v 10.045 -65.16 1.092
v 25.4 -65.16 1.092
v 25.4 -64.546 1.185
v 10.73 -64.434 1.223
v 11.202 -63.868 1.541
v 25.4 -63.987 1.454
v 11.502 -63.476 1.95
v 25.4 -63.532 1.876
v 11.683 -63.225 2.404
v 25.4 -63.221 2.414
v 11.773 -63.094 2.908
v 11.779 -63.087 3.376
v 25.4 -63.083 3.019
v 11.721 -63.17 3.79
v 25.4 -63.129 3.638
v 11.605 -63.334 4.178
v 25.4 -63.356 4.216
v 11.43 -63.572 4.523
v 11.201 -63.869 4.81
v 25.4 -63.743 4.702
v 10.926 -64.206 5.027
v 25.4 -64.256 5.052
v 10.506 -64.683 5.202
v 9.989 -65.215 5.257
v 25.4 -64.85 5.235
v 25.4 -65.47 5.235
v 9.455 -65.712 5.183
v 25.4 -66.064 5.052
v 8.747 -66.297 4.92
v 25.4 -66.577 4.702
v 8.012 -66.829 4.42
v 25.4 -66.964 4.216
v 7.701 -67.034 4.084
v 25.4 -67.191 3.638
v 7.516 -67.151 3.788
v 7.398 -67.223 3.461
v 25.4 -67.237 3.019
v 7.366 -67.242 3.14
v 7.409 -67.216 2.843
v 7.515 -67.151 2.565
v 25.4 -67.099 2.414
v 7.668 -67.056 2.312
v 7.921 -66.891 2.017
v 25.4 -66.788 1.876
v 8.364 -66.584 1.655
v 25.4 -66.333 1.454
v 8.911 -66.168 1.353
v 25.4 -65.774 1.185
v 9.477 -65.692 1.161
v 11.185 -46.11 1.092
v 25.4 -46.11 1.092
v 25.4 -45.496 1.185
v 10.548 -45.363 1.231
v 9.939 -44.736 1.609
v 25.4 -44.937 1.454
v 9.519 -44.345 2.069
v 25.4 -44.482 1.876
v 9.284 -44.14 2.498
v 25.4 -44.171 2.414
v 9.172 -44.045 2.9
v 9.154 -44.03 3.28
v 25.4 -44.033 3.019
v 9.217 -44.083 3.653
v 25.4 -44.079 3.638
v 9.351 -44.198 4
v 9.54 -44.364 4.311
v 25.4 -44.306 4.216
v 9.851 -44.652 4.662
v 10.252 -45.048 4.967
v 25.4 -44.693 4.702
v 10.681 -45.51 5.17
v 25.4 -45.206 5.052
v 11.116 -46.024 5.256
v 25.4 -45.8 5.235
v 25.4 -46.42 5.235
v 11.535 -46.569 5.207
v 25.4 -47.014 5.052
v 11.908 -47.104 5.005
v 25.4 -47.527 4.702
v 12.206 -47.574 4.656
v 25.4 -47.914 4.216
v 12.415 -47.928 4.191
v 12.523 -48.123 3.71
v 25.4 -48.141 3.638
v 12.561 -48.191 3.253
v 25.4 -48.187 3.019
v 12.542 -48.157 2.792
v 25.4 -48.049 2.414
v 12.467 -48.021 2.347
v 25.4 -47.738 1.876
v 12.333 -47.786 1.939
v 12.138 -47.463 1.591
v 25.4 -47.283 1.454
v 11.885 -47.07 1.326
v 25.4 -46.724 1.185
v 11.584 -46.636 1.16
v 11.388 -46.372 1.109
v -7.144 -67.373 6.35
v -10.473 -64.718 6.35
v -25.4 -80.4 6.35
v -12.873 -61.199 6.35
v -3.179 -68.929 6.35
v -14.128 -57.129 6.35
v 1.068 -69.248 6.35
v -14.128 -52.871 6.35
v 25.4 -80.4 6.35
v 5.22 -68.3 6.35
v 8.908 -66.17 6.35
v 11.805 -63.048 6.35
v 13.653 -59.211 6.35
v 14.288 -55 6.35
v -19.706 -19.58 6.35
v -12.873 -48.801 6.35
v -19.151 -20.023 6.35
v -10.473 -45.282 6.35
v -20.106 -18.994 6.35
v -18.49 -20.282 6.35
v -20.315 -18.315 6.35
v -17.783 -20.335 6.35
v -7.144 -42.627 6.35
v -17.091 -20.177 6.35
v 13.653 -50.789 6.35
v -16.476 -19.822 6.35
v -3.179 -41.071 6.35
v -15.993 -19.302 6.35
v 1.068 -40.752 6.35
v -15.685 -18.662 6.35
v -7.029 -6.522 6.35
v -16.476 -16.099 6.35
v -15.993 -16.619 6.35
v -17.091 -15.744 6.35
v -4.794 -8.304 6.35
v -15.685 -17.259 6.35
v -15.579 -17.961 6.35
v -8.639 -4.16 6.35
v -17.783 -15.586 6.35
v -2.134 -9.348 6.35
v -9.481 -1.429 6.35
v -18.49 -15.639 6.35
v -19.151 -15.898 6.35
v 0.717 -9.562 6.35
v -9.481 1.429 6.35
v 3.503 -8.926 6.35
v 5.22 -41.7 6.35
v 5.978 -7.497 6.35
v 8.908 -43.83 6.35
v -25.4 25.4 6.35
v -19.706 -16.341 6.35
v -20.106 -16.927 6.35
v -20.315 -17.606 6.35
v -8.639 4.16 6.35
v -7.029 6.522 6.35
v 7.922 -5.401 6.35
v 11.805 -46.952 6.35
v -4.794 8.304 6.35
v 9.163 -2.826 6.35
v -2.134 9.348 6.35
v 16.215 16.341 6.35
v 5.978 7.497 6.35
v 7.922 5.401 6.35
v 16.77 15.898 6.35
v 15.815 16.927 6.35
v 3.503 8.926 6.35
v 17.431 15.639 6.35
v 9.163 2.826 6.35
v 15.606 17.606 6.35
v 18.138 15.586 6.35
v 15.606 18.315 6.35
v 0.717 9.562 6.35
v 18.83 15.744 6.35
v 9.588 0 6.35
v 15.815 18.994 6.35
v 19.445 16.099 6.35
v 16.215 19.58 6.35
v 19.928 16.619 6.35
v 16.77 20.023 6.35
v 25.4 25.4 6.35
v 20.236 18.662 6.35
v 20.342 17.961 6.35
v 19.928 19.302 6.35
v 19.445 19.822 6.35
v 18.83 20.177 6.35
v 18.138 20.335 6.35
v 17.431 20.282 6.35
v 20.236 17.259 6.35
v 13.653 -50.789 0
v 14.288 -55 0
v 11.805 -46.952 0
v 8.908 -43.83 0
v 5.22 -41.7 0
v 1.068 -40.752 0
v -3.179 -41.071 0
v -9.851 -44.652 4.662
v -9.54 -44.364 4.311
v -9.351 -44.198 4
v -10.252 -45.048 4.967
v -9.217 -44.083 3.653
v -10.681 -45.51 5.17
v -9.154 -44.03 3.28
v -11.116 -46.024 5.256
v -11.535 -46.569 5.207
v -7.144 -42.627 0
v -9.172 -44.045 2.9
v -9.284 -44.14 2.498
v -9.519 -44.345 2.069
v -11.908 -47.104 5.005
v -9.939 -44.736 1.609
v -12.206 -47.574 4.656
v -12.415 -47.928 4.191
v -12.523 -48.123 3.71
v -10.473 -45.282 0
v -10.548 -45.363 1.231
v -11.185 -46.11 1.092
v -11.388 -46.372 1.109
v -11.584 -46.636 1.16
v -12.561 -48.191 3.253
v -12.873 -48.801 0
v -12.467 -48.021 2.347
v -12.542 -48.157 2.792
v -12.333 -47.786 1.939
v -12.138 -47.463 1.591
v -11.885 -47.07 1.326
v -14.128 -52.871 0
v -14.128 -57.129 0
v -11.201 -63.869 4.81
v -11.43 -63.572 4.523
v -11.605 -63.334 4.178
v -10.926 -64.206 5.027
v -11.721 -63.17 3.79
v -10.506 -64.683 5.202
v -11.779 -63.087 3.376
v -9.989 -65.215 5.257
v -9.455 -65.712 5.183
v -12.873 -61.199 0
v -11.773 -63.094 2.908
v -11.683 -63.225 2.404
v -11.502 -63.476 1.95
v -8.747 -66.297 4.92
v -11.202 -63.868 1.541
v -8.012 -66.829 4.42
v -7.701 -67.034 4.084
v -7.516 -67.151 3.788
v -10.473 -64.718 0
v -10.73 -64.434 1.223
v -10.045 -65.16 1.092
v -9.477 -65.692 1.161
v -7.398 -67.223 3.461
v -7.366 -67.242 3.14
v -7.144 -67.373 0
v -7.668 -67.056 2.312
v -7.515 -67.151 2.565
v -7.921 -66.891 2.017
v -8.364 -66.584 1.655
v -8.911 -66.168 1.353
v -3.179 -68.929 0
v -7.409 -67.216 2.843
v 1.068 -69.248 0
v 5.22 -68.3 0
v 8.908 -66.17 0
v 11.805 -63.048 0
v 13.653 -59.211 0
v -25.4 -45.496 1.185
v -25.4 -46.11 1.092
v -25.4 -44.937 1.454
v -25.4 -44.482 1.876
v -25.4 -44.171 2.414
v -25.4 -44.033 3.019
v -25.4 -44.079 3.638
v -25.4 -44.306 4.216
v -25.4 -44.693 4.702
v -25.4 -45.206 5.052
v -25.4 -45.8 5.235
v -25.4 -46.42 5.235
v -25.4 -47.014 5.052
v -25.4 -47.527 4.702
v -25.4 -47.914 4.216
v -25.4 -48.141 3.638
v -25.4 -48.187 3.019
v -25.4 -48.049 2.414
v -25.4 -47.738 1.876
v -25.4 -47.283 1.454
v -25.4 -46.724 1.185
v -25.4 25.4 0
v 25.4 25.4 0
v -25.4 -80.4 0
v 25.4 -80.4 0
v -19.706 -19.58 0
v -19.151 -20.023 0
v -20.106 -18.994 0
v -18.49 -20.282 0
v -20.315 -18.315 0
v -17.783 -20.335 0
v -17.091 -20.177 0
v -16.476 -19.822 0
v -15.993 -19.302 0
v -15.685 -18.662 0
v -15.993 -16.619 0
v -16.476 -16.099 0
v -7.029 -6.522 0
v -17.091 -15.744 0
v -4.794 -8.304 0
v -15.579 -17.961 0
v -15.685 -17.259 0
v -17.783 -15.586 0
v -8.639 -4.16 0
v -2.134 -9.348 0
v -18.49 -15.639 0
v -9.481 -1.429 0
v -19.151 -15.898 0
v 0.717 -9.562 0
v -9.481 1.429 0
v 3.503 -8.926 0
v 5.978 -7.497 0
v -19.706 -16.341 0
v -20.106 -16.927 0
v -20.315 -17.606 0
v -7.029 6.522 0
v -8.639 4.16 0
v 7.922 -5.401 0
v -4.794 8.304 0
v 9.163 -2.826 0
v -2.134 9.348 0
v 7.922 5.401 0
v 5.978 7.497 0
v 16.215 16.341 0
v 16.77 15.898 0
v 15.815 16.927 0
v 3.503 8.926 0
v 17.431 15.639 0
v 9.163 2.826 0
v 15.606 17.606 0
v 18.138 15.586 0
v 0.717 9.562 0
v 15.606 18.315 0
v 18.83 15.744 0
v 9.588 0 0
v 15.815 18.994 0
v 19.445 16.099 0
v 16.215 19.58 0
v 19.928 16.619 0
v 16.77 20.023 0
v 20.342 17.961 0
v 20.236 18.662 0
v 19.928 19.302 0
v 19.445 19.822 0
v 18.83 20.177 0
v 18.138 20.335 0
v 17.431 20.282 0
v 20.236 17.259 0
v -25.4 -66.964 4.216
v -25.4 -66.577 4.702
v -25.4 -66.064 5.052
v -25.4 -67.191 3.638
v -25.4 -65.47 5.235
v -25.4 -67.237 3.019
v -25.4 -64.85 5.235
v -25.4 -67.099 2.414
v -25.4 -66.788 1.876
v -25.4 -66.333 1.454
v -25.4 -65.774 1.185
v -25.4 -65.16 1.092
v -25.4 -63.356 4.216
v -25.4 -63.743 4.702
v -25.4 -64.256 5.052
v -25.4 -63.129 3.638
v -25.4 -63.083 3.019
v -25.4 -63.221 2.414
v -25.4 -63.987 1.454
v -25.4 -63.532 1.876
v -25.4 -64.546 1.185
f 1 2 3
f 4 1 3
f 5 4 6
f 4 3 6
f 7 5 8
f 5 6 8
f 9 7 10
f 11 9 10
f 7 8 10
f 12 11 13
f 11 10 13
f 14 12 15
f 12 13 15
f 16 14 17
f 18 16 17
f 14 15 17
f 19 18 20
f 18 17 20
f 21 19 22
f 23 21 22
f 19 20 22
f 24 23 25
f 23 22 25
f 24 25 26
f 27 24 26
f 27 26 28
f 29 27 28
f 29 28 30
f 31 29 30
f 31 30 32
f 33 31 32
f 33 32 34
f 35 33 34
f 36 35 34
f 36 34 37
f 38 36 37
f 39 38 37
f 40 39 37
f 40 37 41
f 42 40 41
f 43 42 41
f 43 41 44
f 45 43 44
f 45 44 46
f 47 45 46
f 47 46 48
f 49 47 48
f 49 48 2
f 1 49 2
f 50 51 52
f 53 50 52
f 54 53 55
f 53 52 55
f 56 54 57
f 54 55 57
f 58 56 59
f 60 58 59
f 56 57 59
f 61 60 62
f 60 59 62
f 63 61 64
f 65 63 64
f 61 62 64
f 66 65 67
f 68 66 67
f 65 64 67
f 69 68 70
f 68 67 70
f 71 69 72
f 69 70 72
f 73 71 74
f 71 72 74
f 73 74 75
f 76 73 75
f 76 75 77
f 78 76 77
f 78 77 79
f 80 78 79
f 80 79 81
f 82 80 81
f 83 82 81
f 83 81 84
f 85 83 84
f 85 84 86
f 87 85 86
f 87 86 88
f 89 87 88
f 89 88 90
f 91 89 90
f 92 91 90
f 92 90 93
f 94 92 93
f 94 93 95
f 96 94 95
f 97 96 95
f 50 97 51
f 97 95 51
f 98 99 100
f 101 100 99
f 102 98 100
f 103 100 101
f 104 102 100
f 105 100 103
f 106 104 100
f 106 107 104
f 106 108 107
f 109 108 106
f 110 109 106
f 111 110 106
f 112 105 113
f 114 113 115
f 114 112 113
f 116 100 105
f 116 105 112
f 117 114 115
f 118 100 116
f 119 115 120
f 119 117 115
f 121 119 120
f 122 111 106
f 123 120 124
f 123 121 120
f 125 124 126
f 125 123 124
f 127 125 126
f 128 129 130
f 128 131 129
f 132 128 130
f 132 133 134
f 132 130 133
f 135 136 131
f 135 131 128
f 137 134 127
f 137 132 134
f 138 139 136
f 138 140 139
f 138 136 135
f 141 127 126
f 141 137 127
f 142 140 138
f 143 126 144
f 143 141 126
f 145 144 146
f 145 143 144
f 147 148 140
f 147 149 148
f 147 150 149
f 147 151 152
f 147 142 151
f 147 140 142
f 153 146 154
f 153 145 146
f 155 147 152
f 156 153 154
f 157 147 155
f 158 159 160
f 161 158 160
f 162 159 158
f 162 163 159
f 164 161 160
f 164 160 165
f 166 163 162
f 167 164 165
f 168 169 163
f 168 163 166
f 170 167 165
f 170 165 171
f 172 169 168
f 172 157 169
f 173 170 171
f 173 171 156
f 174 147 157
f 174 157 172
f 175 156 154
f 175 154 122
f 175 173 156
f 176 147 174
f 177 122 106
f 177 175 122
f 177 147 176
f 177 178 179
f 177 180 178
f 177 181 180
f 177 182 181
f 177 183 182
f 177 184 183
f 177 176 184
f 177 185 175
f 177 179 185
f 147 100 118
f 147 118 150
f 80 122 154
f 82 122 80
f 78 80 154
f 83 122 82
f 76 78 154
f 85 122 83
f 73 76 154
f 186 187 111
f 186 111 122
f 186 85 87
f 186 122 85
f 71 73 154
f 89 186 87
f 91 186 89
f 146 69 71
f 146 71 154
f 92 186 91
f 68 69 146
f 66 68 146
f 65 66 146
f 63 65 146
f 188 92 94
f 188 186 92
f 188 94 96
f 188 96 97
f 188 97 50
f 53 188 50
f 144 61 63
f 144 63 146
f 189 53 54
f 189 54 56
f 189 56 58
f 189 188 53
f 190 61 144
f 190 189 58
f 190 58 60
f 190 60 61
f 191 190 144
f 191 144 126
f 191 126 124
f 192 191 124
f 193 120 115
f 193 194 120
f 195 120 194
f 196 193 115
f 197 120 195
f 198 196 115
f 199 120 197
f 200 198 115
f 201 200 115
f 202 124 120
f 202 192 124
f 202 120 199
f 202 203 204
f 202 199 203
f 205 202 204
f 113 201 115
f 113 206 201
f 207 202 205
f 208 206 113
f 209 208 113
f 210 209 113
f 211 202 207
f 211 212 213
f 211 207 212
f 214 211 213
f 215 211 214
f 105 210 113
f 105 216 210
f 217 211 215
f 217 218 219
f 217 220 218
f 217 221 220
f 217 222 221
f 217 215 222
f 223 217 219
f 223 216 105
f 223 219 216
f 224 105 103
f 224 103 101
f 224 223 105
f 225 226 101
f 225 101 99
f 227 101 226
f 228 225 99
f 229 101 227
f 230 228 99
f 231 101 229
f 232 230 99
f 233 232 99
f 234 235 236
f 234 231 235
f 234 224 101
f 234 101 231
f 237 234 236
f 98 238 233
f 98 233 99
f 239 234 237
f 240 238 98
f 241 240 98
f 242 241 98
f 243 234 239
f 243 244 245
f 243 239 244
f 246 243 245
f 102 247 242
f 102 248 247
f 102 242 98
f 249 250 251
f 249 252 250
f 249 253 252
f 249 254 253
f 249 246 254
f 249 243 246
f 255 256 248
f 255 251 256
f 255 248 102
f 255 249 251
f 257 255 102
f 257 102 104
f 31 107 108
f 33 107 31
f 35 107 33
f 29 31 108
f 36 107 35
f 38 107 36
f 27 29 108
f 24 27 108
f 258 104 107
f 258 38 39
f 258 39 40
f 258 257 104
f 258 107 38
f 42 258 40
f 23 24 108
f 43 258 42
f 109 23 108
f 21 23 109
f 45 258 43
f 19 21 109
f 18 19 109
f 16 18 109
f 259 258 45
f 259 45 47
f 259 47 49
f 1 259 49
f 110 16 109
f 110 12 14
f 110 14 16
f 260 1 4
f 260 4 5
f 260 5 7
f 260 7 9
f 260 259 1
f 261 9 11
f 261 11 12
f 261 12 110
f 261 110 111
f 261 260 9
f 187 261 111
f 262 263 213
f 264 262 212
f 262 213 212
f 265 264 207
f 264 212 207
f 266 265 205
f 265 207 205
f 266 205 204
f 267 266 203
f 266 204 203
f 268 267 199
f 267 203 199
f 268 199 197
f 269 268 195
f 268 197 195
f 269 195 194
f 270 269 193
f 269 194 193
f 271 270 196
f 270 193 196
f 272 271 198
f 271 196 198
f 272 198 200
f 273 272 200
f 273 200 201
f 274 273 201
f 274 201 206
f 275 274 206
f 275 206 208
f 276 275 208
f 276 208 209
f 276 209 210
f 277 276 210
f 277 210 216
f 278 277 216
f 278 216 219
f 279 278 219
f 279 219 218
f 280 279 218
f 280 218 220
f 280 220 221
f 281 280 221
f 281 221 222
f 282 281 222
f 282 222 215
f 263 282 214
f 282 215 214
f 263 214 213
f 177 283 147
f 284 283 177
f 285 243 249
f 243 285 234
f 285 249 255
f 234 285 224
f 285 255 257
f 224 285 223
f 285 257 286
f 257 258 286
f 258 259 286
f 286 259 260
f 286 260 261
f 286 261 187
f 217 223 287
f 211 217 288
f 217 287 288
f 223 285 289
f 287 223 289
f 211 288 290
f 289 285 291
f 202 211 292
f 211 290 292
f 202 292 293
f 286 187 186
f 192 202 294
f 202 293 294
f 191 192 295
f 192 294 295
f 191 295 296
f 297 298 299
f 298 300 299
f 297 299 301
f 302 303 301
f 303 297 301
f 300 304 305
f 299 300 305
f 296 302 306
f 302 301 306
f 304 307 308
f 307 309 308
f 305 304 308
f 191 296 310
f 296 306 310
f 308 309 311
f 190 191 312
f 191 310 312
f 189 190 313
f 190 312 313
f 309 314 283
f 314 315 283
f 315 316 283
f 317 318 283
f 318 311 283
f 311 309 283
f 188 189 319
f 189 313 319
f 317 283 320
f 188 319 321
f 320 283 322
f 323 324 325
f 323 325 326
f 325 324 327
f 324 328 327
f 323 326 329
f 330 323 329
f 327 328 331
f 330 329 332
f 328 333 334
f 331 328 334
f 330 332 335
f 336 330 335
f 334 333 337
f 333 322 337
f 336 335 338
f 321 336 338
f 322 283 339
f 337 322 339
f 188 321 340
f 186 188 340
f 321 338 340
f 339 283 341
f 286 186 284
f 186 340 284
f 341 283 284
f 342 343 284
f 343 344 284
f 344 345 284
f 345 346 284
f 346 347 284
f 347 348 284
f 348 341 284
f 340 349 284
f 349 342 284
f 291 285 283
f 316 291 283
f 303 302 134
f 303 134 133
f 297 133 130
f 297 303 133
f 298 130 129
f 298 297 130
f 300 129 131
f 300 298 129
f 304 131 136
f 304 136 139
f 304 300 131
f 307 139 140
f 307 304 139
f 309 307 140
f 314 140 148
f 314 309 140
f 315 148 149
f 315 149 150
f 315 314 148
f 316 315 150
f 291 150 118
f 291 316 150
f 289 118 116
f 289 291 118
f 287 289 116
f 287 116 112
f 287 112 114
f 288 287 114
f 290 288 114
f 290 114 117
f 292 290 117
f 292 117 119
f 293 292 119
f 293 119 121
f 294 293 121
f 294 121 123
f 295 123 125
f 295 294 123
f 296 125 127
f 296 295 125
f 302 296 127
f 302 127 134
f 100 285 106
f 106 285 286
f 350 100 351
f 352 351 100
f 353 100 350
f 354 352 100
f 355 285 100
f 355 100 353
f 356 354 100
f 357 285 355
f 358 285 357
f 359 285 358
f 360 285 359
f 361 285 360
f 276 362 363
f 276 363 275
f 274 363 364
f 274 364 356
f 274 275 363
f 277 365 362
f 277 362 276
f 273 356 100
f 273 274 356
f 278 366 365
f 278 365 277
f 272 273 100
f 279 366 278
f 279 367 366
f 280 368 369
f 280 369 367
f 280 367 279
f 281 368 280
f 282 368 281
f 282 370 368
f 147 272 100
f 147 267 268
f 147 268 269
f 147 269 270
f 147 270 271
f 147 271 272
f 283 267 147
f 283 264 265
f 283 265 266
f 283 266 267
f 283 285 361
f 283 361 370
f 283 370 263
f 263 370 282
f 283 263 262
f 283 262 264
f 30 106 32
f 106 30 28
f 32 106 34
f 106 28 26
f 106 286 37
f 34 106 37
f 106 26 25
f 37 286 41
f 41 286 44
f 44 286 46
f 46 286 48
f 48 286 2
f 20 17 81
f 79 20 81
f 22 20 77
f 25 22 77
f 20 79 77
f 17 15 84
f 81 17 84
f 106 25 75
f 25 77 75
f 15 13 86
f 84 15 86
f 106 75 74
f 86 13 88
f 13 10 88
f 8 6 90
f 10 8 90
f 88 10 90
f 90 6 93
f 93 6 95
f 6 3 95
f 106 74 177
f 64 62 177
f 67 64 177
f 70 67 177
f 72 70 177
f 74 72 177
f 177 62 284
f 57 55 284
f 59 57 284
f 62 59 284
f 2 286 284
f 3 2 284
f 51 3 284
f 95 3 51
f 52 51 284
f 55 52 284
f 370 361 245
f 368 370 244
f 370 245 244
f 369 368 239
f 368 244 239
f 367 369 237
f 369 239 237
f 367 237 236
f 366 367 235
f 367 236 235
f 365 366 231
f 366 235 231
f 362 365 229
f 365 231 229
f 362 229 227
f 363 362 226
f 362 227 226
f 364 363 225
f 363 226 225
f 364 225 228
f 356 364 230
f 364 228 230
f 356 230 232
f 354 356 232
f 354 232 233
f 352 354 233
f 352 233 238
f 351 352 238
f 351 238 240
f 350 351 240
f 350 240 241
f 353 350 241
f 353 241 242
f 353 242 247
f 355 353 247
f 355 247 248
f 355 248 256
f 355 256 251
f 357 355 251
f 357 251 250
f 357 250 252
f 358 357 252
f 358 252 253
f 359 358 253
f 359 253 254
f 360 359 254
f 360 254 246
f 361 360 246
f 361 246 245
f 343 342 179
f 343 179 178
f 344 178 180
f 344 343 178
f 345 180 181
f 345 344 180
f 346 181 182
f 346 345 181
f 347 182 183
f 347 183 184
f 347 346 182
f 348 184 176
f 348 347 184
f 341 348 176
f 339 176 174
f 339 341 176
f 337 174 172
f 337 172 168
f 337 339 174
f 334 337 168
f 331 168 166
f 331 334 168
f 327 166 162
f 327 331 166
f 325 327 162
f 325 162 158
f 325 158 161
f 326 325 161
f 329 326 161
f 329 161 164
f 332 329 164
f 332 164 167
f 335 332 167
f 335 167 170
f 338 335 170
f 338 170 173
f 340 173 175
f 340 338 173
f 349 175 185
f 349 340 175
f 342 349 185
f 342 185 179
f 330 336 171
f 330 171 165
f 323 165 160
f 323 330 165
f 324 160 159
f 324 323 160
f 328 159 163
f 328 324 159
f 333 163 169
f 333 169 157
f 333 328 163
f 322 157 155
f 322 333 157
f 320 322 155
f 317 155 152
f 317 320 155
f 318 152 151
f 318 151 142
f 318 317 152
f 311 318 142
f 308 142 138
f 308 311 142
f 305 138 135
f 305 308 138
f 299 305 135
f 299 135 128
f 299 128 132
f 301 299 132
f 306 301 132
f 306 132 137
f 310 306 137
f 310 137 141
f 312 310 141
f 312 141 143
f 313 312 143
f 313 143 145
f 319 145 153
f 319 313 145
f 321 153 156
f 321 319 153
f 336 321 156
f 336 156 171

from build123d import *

# Parameters (mm, degrees)
SKETCH2_W           = 50.8
SKETCH2_H           = 105.799998966
SKETCH2_R           = 9.5885
SKETCH2_R_2         = 14.2875
SKETCH2_R_3         = 2.38125
BOSS_EXTRUDE1_DEPTH = 6.35
SKETCH6_R           = 2.0828
CUT_EXTRUDE1_DEPTH  = 51.8


with BuildPart() as part:
    # Sketch2 → Boss-Extrude1 (new body)
    with BuildSketch(Plane.XY):
        with Locations((0, -27.499999483)):
            Rectangle(SKETCH2_W, SKETCH2_H)
        Circle(SKETCH2_R, mode=Mode.SUBTRACT)
        with Locations((0, -54.999998966)):
            Circle(SKETCH2_R_2, mode=Mode.SUBTRACT)
        with Locations((-17.960512242, -17.960512242)):
            Circle(SKETCH2_R_3, mode=Mode.SUBTRACT)
        with Locations((17.960512242, 17.960512242)):
            Circle(SKETCH2_R_3, mode=Mode.SUBTRACT)
    extrude(amount=BOSS_EXTRUDE1_DEPTH)

    # Sketch6 → Cut-Extrude1 (cut, through all)
    with BuildSketch(Plane(origin=(25.4, 0, 0), x_dir=(0, 0, -1), z_dir=(1, 0, 0))):
        with Locations((-3.175, -65.159998966)):
            Circle(SKETCH6_R)
        with Locations((-3.175, -46.109998966)):
            Circle(SKETCH6_R)
    extrude(amount=-CUT_EXTRUDE1_DEPTH, mode=Mode.SUBTRACT)


solid = part.part
